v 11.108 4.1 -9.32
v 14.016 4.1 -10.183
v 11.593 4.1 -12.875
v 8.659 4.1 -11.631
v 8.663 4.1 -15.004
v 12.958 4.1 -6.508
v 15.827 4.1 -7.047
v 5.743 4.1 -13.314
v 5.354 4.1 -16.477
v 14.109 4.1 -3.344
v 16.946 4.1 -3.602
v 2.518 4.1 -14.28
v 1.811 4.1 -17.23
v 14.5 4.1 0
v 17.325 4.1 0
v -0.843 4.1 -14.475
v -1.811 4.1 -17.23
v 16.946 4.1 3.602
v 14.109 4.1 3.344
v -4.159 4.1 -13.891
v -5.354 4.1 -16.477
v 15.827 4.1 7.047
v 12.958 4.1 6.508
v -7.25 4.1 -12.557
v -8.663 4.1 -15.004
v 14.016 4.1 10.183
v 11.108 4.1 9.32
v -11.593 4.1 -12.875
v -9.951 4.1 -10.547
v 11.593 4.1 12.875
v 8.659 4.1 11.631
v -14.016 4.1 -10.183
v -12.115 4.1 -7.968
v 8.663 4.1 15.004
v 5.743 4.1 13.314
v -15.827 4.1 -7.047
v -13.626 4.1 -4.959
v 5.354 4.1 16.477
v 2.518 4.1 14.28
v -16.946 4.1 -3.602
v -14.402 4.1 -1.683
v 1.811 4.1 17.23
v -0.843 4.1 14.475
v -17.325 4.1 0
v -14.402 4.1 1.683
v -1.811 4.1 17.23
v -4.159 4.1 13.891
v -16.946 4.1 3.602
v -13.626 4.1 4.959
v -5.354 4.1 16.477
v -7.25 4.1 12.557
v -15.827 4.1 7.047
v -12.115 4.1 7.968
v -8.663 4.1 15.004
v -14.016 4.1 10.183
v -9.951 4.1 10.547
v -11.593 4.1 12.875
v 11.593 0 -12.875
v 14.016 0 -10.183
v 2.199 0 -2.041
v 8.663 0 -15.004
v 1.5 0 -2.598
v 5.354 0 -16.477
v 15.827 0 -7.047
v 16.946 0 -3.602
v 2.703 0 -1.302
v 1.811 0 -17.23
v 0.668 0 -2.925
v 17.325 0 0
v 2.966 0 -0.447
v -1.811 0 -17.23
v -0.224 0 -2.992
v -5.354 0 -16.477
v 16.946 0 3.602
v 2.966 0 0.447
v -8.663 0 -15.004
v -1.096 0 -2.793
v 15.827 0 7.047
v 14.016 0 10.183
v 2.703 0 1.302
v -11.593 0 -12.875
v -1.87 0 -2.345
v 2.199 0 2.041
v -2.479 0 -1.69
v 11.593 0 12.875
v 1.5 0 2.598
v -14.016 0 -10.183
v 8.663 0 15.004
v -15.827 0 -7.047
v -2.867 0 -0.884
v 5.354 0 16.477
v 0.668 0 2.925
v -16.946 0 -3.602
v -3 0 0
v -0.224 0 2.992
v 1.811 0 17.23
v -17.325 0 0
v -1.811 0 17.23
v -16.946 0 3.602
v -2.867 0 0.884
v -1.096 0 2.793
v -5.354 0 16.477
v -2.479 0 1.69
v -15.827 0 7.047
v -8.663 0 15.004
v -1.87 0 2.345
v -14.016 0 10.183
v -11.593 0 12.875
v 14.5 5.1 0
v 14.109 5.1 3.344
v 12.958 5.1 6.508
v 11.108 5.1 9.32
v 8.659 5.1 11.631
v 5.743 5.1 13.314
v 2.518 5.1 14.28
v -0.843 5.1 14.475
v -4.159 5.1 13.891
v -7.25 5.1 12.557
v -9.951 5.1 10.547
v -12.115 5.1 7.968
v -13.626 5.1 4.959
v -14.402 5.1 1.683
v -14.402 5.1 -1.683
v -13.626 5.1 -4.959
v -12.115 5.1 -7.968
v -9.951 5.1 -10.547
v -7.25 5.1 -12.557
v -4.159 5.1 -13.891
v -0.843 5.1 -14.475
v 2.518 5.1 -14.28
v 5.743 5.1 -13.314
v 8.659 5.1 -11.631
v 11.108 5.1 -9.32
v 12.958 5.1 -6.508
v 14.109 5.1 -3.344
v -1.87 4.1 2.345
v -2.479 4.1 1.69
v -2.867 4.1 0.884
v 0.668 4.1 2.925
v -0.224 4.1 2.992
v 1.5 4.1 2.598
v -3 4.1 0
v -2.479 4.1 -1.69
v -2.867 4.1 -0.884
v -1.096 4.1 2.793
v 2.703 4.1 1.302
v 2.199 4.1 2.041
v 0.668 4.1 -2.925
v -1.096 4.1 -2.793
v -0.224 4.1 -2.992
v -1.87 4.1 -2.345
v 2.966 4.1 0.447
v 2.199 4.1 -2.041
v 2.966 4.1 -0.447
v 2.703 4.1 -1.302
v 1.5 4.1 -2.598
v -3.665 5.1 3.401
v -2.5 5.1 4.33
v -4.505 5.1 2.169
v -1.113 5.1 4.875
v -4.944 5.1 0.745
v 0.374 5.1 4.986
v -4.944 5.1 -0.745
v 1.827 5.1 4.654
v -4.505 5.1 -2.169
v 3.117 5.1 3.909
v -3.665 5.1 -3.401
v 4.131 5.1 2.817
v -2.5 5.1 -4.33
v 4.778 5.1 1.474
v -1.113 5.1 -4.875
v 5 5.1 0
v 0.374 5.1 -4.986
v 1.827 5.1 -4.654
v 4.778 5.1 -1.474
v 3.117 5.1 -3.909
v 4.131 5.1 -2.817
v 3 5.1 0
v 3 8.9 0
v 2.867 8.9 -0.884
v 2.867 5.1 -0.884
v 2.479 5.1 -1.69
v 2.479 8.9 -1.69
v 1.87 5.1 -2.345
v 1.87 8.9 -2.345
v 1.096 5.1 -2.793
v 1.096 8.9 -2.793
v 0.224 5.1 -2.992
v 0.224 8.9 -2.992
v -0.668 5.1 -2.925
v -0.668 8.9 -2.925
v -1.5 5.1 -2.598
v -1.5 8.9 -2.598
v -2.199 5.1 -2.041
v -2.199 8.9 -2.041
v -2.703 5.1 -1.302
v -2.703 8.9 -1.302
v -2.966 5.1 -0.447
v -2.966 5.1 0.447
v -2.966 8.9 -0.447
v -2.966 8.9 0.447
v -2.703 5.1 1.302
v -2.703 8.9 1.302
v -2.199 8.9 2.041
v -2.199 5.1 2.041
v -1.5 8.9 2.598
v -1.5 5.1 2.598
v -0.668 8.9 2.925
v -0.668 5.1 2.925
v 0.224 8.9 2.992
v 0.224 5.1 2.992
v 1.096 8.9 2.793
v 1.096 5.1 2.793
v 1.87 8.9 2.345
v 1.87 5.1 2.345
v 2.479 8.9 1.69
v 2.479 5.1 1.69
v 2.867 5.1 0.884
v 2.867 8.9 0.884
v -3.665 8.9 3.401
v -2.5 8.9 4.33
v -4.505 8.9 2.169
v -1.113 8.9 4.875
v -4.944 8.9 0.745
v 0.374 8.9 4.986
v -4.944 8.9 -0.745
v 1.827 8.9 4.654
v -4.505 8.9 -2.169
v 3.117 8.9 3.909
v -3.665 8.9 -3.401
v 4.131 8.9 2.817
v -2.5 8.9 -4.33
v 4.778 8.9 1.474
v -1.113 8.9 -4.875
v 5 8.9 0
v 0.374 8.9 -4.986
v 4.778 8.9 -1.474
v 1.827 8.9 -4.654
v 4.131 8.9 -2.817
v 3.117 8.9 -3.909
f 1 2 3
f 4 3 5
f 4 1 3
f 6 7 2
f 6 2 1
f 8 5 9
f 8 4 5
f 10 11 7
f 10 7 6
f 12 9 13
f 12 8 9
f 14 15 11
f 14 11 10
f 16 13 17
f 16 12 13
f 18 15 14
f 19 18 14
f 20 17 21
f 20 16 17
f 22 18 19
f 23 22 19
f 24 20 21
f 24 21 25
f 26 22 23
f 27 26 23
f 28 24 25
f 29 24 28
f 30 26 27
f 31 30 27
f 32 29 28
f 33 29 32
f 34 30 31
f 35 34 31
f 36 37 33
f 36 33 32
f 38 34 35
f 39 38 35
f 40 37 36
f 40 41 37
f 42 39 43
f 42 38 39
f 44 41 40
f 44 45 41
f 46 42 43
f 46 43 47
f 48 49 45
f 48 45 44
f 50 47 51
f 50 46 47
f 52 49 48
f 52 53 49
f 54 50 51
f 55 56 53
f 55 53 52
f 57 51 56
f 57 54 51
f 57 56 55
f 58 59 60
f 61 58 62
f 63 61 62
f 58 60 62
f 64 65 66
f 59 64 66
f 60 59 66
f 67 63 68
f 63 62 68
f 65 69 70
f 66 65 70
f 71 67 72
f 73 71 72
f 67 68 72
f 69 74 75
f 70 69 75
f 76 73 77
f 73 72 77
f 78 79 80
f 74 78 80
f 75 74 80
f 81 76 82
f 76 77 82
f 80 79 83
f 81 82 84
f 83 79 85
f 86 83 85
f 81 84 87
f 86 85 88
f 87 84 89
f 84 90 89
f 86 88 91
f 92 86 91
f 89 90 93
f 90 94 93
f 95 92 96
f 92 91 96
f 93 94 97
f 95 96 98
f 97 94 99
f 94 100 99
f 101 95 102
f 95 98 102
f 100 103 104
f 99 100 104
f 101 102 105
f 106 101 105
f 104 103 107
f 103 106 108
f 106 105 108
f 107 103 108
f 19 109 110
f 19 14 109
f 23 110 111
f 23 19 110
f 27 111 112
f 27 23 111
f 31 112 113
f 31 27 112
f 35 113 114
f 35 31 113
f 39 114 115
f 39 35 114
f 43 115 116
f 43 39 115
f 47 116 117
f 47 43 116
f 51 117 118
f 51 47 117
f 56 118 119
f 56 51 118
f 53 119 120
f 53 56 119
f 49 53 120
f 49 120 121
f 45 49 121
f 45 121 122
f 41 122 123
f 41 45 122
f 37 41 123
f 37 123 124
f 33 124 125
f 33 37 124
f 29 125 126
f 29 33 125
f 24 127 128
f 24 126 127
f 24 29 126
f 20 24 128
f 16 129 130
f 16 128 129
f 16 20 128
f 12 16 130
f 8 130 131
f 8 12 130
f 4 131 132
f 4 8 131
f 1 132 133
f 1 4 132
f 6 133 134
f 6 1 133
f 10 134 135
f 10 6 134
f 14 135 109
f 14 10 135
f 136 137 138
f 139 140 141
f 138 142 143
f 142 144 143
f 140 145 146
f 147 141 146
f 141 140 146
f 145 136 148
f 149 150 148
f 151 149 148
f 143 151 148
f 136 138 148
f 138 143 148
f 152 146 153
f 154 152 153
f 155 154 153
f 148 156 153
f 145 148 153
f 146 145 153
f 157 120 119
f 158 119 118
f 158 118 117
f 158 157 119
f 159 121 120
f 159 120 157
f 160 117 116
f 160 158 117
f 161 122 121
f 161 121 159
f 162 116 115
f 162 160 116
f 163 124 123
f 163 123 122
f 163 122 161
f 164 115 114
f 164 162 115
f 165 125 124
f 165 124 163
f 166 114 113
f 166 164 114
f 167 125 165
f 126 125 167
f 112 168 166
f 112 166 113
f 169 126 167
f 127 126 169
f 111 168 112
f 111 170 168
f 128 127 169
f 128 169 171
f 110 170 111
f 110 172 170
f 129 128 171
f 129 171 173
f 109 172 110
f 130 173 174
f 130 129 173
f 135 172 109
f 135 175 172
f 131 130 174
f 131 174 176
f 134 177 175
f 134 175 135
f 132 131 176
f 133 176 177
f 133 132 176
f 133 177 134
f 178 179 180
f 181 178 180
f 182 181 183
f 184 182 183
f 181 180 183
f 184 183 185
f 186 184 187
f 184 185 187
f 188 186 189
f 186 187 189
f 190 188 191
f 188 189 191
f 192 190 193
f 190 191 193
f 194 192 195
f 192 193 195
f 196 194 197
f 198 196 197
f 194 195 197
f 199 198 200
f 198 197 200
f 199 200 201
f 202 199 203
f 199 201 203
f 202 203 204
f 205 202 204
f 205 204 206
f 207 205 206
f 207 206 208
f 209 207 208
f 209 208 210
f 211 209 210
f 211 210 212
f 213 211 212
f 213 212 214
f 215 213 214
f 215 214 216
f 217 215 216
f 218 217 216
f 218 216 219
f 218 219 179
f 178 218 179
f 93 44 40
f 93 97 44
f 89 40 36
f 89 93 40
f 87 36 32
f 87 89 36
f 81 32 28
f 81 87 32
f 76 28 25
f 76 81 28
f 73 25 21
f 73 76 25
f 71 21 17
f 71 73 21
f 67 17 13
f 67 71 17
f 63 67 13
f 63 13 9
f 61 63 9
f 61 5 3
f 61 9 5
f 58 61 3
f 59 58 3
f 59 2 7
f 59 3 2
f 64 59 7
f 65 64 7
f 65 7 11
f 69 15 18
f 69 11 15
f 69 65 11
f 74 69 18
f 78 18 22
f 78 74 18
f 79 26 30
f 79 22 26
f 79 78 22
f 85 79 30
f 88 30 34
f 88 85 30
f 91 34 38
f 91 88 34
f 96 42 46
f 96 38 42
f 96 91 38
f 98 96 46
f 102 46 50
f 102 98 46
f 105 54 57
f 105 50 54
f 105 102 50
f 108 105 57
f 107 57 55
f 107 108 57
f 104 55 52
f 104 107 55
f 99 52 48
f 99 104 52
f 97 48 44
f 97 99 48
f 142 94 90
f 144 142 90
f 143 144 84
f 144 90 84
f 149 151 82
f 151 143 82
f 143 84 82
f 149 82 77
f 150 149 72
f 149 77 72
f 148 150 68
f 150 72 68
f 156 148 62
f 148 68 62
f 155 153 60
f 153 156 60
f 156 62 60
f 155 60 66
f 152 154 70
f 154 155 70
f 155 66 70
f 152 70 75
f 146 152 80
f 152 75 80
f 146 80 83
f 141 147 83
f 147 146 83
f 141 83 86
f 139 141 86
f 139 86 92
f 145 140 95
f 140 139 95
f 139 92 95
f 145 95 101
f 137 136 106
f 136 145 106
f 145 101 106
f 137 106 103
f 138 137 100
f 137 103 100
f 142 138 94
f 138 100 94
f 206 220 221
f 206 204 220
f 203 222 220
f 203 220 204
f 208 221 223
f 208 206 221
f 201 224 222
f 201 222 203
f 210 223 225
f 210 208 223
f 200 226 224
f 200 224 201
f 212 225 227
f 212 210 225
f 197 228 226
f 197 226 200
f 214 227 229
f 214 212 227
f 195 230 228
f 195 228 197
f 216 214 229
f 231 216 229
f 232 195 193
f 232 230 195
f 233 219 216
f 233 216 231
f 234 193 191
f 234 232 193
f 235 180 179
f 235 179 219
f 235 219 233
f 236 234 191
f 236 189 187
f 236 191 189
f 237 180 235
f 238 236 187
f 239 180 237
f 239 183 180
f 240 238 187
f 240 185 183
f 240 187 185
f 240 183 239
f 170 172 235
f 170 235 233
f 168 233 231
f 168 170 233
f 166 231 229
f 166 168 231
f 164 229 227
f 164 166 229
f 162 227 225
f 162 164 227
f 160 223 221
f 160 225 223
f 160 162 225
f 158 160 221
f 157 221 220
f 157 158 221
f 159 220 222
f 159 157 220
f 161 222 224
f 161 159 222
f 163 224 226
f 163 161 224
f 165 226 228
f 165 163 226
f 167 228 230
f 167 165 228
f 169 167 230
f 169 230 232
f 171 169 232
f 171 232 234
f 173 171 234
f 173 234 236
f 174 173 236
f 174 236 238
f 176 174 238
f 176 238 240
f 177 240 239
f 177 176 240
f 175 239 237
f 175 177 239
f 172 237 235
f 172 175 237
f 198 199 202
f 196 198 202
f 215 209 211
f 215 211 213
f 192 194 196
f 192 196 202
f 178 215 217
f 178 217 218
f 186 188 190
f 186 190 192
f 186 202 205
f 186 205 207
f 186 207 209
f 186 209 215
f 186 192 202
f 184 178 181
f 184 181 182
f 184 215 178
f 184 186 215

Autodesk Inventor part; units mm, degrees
ref_plane "YZ Plane" through (0, 0, 0) normal (1, 0, 0) x (0, 1, 0)
ref_plane "XZ Plane" through (0, 0, 0) normal (0, 1, 0) x (-1, 0, 0)
ref_plane "XY Plane" through (0, 0, 0) normal (0, 0, 1) x (1, 0, 0)
sketch "Sketch1" plane through (0, 0, 0) normal (0, 1, 0) x (-1, 0, 0)
  circle A0 centre (0, 0) radius 17.325
  circle A1 centre (0, 0) radius 3
  dimension "d0" = 34.65
  dimension "d1" = 6
extrude "Extrusion1" add sketch "Sketch1" along normal blind 4.1
sketch "Sketch2" plane through (0, 4.1, 0) normal (0, 1, 0) x (1, 0, 0)
  circle A0 centre (0, 0) radius 3 projected
  circle A1 centre (0, 0) radius 17.325 projected
  circle A2 centre (0, 0) radius 14.5
  dimension "d4" = 29
extrude "Extrusion2" add sketch "Sketch2" along normal blind 1 contours A2
sketch "Sketch3" plane through (0, 5.1, 0) normal (0, 1, 0) x (1, 0, 0)
  circle A0 centre (0, 0) radius 3 projected
extrude "Extrusion3" add sketch "Sketch3" against normal blind 1
sketch "Sketch4" plane through (0, 5.1, 0) normal (0, 1, 0) x (1, 0, 0)
  circle A0 centre (0, 0) radius 14.5 projected
  circle A1 centre (0, 0) radius 5
  dimension "d9" = 10
extrude "Extrusion4" add sketch "Sketch4" along normal blind 3.8 contours A1
sketch "Sketch5" plane through (0, 8.9, 0) normal (0, 1, 0) x (1, 0, 0)
  circle A0 centre (0, 0) radius 5 projected
  circle A1 centre (0, 0) radius 3
  dimension "d12" = 6
extrude "Extrusion5" cut sketch "Sketch5" against normal blind 3.8 contours A1
properties part number "kolecko_servo(2)"
